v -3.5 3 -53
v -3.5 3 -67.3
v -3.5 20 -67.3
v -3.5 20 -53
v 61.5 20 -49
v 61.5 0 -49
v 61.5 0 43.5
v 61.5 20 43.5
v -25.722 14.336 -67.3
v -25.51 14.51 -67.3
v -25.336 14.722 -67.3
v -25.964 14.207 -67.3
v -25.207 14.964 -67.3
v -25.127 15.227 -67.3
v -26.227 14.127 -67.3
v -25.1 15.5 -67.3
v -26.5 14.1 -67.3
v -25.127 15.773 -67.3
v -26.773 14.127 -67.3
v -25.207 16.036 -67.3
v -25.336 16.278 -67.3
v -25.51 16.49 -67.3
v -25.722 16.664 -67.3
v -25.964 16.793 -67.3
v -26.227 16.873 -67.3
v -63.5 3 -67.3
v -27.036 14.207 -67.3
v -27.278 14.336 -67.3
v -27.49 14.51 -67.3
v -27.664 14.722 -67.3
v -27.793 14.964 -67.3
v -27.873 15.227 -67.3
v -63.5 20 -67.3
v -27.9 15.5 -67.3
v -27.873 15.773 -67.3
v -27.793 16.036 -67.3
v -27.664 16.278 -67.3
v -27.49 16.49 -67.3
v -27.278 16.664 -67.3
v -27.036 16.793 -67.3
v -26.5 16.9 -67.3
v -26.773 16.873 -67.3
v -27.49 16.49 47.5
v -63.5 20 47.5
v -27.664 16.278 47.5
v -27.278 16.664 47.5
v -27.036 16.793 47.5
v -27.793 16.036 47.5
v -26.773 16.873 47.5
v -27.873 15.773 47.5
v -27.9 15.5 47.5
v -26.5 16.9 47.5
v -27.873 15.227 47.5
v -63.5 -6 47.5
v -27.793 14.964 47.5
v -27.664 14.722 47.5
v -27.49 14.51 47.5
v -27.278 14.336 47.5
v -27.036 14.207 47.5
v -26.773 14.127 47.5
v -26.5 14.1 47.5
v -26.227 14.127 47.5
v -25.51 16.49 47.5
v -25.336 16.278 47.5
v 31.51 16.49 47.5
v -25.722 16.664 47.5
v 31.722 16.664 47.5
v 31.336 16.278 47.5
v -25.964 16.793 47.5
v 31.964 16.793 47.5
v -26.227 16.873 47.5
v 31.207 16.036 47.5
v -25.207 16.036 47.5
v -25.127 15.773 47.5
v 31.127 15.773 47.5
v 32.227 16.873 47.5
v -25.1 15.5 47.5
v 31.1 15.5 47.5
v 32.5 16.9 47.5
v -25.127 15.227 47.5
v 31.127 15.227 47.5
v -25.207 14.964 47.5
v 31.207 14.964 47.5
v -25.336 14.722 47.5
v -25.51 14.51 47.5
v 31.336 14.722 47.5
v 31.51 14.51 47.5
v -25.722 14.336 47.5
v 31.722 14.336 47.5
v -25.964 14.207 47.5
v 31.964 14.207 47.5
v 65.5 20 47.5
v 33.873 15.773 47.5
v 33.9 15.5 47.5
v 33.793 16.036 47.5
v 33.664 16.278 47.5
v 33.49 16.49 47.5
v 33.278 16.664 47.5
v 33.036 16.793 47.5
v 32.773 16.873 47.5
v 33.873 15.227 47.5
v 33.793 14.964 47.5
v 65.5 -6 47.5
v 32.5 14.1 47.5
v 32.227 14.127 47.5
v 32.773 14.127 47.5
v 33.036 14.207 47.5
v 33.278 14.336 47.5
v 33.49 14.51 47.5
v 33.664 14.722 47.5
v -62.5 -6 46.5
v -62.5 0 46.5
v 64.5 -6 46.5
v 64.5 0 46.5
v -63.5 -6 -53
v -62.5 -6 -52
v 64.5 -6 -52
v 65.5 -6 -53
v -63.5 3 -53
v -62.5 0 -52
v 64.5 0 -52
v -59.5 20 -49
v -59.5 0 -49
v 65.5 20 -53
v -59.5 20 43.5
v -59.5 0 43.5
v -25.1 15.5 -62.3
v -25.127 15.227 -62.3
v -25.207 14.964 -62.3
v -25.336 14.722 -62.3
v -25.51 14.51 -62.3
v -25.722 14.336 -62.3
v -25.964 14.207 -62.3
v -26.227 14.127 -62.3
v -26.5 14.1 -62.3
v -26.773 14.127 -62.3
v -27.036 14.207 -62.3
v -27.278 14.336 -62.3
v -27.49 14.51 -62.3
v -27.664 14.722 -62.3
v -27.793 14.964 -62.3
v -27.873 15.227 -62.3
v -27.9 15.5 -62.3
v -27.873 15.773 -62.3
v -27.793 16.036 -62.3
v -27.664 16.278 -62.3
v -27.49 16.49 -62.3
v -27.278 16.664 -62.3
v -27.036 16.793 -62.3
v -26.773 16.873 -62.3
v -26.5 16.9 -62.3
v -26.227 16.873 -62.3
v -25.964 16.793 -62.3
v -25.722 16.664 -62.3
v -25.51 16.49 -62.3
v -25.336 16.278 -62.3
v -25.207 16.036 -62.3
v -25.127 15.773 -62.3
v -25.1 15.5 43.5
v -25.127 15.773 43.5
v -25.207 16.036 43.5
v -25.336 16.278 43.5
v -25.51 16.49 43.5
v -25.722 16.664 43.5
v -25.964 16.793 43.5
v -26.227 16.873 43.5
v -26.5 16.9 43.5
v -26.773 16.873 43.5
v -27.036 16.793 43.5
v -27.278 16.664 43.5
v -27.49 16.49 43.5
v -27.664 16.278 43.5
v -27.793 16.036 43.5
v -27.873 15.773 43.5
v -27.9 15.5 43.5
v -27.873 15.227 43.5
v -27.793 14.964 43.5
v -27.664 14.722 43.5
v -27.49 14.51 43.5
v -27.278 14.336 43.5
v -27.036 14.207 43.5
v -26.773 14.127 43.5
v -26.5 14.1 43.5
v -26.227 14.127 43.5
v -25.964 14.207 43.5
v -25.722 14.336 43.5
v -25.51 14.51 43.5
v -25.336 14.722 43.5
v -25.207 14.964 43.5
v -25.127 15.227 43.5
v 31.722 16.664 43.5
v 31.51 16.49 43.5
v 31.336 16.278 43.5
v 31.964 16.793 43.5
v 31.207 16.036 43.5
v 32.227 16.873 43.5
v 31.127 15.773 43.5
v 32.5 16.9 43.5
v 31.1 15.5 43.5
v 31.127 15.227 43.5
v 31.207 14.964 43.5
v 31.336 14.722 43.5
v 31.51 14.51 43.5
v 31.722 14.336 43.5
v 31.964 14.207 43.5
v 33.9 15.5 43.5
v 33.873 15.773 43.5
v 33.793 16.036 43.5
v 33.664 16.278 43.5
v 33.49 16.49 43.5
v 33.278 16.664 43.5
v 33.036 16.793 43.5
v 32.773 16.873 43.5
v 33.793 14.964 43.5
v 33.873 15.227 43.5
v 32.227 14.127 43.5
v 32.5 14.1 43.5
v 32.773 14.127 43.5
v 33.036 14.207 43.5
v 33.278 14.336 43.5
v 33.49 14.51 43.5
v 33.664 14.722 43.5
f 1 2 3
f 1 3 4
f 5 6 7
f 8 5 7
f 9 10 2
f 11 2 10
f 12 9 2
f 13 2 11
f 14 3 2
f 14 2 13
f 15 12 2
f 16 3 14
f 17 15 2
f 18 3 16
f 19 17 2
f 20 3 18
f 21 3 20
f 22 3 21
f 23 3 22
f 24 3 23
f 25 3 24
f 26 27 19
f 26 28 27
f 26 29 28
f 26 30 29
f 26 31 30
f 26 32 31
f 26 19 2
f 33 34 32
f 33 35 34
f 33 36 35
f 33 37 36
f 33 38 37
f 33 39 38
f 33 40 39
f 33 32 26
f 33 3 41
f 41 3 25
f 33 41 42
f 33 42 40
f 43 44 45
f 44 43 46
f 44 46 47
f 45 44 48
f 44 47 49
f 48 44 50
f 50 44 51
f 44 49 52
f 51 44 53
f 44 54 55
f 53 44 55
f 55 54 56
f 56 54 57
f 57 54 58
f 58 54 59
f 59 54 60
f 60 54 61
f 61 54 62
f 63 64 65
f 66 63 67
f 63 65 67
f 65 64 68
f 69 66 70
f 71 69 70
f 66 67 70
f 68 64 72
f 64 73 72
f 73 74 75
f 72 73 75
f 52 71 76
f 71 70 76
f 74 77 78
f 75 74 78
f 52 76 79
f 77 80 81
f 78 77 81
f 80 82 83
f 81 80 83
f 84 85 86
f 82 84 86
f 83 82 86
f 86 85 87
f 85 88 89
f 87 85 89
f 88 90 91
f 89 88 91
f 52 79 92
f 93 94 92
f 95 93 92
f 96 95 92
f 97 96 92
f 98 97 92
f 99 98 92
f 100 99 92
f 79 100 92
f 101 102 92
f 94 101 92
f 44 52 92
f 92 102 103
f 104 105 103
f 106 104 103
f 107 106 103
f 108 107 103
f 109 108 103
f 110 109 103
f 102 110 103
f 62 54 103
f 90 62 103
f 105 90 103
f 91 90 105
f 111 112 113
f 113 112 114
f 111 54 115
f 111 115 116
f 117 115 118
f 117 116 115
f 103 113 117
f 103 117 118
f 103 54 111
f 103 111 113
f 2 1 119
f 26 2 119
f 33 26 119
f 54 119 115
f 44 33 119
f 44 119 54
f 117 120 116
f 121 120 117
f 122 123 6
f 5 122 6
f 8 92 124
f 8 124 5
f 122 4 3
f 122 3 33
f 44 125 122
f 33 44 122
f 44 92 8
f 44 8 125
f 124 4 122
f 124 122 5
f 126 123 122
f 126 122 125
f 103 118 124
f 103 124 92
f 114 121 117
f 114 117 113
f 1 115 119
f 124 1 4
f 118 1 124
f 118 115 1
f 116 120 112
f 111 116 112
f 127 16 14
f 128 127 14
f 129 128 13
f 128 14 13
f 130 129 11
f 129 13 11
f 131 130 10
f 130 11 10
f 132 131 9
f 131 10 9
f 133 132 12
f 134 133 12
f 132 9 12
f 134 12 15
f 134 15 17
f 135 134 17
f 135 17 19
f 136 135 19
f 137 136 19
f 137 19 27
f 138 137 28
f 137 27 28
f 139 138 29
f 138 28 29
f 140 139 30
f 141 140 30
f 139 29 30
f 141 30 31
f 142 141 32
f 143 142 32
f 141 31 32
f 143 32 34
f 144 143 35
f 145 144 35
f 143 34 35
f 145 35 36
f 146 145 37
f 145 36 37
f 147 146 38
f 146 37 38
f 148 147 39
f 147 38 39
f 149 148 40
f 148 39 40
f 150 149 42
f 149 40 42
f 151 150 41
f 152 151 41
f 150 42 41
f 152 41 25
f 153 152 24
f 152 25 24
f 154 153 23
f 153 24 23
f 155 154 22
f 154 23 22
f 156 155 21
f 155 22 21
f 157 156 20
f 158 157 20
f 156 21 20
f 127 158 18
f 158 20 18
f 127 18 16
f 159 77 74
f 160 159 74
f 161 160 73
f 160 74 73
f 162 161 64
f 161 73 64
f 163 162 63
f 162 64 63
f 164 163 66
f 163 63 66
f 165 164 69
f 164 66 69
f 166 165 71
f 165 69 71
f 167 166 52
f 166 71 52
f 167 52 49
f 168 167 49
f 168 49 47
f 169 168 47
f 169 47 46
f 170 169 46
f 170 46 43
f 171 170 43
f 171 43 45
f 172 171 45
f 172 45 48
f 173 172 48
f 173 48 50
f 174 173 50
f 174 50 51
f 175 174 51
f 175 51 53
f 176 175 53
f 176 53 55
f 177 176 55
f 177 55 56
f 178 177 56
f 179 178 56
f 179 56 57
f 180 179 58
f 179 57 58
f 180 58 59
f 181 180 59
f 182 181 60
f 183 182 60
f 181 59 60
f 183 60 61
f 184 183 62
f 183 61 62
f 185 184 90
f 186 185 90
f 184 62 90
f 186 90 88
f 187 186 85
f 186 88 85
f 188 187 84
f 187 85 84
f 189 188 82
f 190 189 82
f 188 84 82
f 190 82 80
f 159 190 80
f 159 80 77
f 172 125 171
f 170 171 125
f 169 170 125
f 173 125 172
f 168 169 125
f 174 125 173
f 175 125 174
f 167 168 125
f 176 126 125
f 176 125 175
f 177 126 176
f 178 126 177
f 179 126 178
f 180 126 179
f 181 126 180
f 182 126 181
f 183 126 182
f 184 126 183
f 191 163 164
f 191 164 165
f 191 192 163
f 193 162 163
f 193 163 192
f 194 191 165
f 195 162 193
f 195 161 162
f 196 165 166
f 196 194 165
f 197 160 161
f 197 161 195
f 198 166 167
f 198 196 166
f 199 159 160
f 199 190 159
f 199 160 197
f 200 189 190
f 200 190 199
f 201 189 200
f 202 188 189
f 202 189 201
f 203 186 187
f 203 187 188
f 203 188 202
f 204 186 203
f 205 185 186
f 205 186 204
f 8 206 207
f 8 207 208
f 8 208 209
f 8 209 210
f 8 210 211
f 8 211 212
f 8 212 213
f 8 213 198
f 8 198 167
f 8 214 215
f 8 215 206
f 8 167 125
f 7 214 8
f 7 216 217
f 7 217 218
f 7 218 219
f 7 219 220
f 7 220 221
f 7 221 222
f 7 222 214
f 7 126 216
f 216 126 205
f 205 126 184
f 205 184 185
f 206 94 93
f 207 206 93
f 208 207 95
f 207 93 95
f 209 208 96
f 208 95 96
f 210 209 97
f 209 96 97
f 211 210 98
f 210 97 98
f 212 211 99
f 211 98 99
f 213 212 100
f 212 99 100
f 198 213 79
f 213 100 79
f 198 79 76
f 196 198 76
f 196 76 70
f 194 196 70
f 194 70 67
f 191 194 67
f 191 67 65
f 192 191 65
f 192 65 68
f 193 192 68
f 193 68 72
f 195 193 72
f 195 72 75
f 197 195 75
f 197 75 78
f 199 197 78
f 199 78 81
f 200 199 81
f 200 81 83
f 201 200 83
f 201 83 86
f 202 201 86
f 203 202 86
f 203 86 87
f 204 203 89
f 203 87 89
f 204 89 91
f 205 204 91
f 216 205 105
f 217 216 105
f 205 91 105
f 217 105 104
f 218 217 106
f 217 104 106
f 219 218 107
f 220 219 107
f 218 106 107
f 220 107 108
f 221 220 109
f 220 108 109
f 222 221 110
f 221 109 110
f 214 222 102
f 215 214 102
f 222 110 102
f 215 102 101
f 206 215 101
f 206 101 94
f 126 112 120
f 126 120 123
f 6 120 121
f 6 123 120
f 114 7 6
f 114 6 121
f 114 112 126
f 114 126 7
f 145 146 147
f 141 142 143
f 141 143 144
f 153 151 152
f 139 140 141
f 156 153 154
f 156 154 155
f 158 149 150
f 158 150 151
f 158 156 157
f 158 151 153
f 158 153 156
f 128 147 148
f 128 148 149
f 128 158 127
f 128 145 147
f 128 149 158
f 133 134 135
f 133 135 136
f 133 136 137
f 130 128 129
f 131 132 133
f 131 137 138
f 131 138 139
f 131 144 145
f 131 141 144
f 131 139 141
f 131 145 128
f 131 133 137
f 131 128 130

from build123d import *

# Parameters (mm, degrees)
F1_W      = 129
F1_H      = 100.5
F1_W_2    = 127
F1_H_2    = 98.5
F2_DEPTH  = 6
F3_W      = 129
F3_H      = 100.5
F3_W_2    = 121
F3_H_2    = 92.5
F4_DEPTH  = 20
F5_W      = 60
F5_H      = 14.3
F6_DEPTH  = 17
F7_R      = 1.4
F8_DEPTH  = 7.9
F9_R      = 1.4
F10_DEPTH = 5


with BuildPart() as f2:
    # F1 (on Front) → F2 (new body)
    with BuildSketch(Plane.XZ):
        with Locations((1, -2.75)):
            Rectangle(F1_W, F1_H)
        with Locations((1, -2.75)):
            Rectangle(F1_W_2, F1_H_2, mode=Mode.SUBTRACT)
    extrude(amount=F2_DEPTH)

    # F3 (on Front) → F4 (join)
    with BuildSketch(Plane.XZ):
        with Locations((1, -2.75)):
            Rectangle(F3_W, F3_H)
        with Locations((1, -2.75)):
            Rectangle(F3_W_2, F3_H_2, mode=Mode.SUBTRACT)
    extrude(amount=-F4_DEPTH)

    # F5 (on face) → F6 (join)
    with BuildSketch(Plane(origin=(0, 20, 0), x_dir=(-1, 0, 0), z_dir=(0, 1, 0))):
        with Locations((33.5, -60.15)):
            Rectangle(F5_W, F5_H)
    extrude(amount=-F6_DEPTH)

    # F7 (on face) → F8 (cut)
    with BuildSketch(Plane.XY.offset(47.5)):
        with Locations((-26.5, 15.5)):
            Circle(F7_R)
        with Locations((32.5, 15.5)):
            Circle(F7_R)
    extrude(amount=-F8_DEPTH, mode=Mode.SUBTRACT)

    # F9 (on face) → F10 (cut)
    with BuildSketch(Plane(origin=(0, 0, -67.3), x_dir=(1, 0, 0), z_dir=(0, 0, -1))):
        with Locations((-26.5, -15.5)):
            Circle(F9_R)
    extrude(amount=-F10_DEPTH, mode=Mode.SUBTRACT)


solid = f2.part
